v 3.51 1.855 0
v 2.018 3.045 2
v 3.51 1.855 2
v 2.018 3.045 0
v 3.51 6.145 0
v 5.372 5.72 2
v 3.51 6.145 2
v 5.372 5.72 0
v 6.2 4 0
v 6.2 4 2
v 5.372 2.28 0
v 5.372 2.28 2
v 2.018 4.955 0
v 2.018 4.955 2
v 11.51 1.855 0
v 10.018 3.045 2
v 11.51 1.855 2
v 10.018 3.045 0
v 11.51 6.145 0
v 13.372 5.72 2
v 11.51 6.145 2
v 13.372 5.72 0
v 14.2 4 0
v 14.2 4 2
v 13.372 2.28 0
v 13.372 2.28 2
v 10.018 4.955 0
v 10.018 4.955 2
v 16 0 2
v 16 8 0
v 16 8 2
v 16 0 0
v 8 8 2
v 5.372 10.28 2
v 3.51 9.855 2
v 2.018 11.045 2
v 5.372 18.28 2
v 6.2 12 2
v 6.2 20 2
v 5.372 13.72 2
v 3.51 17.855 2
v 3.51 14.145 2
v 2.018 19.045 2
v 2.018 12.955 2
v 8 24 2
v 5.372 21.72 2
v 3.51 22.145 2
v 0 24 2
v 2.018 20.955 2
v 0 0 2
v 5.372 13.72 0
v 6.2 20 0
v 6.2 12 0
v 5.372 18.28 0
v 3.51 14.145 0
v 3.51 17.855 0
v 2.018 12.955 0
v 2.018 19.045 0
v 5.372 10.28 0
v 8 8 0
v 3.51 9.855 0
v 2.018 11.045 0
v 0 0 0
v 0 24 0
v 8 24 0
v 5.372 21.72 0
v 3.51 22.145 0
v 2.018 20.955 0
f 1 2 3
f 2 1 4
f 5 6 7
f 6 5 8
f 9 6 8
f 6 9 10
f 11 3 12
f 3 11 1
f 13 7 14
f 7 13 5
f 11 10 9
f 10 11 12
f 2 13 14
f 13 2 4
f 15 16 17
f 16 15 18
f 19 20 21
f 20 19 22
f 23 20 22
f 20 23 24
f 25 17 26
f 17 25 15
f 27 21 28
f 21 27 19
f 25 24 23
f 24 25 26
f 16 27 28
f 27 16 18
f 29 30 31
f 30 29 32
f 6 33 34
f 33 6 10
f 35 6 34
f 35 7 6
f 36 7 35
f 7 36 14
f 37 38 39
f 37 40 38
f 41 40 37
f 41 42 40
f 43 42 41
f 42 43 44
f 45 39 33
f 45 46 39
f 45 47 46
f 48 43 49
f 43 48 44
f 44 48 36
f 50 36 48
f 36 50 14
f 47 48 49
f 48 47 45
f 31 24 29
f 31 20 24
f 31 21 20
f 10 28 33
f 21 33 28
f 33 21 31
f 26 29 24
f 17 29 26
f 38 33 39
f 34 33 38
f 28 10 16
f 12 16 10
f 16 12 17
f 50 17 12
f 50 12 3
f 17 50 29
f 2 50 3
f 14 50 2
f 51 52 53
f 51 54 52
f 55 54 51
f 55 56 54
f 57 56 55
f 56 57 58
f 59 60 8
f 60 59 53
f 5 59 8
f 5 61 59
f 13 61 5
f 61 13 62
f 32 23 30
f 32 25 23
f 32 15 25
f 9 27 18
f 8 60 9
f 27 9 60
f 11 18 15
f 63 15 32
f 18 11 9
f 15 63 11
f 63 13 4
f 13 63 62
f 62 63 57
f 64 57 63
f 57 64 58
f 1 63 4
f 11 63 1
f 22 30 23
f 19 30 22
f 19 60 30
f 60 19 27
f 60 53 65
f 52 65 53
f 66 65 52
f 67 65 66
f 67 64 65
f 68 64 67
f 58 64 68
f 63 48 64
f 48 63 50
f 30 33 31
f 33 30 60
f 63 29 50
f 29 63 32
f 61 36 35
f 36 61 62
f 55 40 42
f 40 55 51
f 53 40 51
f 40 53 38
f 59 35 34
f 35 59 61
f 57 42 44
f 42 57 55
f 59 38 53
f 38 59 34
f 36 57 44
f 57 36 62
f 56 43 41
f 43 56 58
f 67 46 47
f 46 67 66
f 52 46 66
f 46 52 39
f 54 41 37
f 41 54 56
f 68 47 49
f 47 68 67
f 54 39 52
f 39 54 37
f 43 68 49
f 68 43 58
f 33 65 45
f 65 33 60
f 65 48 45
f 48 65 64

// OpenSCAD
// configuration
width = 2;       // in holes
height = 3;      // in holes
thickness = 2;   // in mm
space = 4;       // inter-hole space in mm
hole = 4;        // hole diameter in mm
pad = space/2;   // in mm

// internal data
w = 2*pad + hole;
xl = width*hole + (width-1)*space + 2*pad;
yl = height*hole + (height-1)*space + 2*pad;

difference() {
    cube([xl, w, thickness]);
    for(i=[1:width]) {
        translate([
            i*hole + (i - 1)*space - hole/2 + pad,
            pad + hole/2,
            -thickness
        ]) {
            cylinder(r = hole/2 + 0.2, h = 3*thickness);
        };
    };
};
difference() {
    cube([w, yl, thickness]);
    for(i=[1:height]) {
        translate([
            pad + hole/2,
            i*hole + (i - 1)*space - hole/2 + pad,
            -thickness
        ]) {
            cylinder(r = hole/2 + 0.2, h = 3*thickness);
        };
    };
};
